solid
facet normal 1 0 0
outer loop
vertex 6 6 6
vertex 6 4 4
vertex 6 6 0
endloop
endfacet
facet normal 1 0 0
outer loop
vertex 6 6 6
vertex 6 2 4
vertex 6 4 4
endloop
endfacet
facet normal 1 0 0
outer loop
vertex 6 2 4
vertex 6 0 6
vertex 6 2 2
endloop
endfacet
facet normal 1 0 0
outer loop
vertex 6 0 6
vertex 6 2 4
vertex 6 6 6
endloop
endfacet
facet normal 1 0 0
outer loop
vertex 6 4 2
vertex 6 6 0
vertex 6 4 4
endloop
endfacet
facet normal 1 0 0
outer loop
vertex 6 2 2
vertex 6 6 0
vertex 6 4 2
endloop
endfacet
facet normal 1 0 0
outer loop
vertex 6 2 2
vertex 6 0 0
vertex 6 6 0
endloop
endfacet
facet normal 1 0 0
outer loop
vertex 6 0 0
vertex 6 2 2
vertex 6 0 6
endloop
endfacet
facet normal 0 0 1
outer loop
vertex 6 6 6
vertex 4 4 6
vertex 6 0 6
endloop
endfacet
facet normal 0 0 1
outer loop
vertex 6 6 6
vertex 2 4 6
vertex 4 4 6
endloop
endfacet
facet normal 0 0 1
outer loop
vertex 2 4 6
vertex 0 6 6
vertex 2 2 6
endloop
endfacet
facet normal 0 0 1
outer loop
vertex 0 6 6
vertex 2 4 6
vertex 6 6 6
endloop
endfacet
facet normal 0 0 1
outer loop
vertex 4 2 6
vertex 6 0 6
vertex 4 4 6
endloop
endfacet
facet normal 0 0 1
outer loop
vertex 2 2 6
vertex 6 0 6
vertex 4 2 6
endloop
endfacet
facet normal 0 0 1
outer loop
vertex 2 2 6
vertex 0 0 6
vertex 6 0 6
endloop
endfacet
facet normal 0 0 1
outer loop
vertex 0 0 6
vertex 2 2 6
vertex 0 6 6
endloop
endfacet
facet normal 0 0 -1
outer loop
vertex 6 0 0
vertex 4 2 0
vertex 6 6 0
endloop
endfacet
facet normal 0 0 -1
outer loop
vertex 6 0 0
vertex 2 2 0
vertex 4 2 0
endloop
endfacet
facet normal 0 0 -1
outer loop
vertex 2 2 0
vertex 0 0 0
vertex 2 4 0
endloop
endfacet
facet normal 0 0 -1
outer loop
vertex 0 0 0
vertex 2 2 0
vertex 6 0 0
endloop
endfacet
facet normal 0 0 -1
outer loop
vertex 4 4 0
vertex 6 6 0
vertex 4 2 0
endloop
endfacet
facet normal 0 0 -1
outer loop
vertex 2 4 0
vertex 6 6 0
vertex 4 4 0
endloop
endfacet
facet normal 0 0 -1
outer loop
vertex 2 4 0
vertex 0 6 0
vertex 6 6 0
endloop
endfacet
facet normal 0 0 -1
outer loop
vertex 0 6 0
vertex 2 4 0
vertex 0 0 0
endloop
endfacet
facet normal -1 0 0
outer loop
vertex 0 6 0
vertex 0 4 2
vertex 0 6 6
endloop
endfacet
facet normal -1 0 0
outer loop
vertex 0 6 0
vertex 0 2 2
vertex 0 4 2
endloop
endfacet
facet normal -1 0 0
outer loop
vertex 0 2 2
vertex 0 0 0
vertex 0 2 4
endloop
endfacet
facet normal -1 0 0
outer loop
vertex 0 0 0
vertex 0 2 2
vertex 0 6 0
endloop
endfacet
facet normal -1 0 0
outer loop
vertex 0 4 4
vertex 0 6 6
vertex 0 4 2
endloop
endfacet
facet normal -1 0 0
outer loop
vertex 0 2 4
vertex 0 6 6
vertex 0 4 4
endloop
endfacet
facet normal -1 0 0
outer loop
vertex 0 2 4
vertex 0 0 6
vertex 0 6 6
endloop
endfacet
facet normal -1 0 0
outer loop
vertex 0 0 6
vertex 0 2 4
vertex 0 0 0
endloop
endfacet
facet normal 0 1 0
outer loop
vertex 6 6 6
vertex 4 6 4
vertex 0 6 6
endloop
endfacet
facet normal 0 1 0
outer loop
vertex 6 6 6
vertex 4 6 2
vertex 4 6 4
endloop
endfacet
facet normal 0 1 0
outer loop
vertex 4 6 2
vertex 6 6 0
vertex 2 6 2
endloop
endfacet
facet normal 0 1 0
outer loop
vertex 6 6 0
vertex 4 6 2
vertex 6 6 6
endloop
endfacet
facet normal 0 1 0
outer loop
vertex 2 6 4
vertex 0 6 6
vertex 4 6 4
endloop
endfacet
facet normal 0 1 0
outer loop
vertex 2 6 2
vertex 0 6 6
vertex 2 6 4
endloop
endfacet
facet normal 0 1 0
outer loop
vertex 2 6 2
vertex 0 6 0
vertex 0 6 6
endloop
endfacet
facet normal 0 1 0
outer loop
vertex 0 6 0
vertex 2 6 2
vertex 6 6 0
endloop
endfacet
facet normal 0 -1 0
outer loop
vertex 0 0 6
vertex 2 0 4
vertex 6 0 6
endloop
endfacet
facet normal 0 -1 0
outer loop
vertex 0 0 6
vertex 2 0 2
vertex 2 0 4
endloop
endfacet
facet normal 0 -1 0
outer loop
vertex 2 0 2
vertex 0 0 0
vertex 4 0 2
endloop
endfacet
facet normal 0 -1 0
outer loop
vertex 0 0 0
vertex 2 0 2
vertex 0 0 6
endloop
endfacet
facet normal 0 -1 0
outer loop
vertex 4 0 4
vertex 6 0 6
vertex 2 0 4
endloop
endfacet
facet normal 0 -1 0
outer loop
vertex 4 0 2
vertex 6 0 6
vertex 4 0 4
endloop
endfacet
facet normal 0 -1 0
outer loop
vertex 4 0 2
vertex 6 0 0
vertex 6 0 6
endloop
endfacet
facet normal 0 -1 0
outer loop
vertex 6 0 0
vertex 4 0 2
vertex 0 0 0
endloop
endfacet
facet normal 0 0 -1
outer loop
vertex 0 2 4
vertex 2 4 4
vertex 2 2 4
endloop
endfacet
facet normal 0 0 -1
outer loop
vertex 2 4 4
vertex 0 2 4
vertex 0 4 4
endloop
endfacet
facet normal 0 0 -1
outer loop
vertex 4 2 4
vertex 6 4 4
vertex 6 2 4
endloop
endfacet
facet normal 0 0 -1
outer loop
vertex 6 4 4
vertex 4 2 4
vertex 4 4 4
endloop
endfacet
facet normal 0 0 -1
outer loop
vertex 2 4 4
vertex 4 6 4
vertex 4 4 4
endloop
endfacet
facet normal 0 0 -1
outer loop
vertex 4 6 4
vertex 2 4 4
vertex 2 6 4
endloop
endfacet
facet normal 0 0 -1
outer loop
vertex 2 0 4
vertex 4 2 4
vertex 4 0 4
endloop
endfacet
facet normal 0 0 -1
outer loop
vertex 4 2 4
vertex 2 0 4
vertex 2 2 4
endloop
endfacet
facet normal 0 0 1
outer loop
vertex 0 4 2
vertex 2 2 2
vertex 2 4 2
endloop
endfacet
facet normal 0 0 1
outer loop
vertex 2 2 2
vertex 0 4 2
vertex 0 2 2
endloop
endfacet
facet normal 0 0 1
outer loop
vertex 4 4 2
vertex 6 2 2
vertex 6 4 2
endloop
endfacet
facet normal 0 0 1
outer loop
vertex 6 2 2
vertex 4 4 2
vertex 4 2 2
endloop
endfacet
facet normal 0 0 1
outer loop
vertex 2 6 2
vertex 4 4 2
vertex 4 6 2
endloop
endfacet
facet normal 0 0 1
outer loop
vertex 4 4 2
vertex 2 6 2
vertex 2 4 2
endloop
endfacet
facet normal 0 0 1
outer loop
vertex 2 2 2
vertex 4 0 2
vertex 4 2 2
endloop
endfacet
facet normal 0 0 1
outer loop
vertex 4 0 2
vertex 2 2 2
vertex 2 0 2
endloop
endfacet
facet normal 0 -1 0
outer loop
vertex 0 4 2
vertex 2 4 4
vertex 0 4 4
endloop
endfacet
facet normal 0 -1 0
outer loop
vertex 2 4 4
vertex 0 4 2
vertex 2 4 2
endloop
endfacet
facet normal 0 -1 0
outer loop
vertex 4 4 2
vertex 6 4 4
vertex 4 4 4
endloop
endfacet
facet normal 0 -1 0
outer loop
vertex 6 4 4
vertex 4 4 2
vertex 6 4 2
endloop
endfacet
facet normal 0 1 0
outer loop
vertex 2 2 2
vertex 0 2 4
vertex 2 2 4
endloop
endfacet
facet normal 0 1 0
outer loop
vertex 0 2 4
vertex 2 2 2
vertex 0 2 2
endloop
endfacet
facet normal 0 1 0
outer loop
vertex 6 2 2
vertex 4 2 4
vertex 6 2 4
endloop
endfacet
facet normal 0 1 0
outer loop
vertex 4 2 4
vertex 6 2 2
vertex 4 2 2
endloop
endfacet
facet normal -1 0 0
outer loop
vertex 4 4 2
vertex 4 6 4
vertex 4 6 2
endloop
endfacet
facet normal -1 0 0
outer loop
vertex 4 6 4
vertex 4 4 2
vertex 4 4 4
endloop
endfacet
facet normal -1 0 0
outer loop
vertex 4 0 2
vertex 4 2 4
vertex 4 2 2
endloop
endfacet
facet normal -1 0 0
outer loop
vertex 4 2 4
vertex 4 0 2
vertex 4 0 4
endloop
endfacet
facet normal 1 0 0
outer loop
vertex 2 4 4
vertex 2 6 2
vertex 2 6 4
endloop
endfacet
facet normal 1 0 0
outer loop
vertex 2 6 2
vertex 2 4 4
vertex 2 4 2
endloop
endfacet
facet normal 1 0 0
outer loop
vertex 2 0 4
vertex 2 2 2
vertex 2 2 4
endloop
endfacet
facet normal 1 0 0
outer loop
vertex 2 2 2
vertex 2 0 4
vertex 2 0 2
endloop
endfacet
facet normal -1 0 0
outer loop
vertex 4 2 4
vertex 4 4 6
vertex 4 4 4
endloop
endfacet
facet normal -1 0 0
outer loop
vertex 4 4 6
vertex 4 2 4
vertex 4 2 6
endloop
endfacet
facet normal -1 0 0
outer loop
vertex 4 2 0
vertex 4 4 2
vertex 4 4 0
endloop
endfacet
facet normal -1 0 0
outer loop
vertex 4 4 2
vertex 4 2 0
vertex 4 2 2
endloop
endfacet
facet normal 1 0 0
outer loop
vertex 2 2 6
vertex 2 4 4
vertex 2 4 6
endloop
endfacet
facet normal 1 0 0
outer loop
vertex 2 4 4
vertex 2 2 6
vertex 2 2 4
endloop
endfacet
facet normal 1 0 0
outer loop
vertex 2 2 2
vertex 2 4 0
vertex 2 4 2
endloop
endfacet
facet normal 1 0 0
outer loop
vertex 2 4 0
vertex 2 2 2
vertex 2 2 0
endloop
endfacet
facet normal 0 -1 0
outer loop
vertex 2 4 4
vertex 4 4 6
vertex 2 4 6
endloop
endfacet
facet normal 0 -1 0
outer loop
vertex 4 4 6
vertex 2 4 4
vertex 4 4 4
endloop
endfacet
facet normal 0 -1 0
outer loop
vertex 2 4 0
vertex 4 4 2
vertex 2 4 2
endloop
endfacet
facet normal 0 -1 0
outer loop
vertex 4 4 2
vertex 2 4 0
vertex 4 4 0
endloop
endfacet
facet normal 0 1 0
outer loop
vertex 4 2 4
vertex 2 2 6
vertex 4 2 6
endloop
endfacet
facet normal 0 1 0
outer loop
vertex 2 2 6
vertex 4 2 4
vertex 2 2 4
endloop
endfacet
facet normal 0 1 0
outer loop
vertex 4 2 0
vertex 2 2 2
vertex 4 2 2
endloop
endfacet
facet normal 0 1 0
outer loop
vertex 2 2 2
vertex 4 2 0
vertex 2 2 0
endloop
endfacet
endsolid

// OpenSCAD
// file: vars.scad
BASE_SIZE = 6;
OBJECT_MATRIX = [
    1, 1, 1,
    1, 0, 1,
    1, 1, 1,
    
    1, 0, 1,
    0, 0, 0,
    1, 0, 1,
    
    1, 1, 1,
    1, 0, 1,
    1, 1, 1
];
// main file
include <vars.scad>;

module base() {
    CUTOUT_SIZE = BASE_SIZE / 3;
    CUTOUT_LENGTH = BASE_SIZE + 1;
    translate([BASE_SIZE / 2, BASE_SIZE / 2, BASE_SIZE / 2]) {
        difference() {
            cube(BASE_SIZE, center = true);
            cube([CUTOUT_LENGTH, CUTOUT_SIZE, CUTOUT_SIZE], center = true);
            cube([CUTOUT_SIZE, CUTOUT_LENGTH, CUTOUT_SIZE], center = true);
            cube([CUTOUT_SIZE, CUTOUT_SIZE, CUTOUT_LENGTH], center = true);
        }
    }
}

color("White", 1)
    base();
